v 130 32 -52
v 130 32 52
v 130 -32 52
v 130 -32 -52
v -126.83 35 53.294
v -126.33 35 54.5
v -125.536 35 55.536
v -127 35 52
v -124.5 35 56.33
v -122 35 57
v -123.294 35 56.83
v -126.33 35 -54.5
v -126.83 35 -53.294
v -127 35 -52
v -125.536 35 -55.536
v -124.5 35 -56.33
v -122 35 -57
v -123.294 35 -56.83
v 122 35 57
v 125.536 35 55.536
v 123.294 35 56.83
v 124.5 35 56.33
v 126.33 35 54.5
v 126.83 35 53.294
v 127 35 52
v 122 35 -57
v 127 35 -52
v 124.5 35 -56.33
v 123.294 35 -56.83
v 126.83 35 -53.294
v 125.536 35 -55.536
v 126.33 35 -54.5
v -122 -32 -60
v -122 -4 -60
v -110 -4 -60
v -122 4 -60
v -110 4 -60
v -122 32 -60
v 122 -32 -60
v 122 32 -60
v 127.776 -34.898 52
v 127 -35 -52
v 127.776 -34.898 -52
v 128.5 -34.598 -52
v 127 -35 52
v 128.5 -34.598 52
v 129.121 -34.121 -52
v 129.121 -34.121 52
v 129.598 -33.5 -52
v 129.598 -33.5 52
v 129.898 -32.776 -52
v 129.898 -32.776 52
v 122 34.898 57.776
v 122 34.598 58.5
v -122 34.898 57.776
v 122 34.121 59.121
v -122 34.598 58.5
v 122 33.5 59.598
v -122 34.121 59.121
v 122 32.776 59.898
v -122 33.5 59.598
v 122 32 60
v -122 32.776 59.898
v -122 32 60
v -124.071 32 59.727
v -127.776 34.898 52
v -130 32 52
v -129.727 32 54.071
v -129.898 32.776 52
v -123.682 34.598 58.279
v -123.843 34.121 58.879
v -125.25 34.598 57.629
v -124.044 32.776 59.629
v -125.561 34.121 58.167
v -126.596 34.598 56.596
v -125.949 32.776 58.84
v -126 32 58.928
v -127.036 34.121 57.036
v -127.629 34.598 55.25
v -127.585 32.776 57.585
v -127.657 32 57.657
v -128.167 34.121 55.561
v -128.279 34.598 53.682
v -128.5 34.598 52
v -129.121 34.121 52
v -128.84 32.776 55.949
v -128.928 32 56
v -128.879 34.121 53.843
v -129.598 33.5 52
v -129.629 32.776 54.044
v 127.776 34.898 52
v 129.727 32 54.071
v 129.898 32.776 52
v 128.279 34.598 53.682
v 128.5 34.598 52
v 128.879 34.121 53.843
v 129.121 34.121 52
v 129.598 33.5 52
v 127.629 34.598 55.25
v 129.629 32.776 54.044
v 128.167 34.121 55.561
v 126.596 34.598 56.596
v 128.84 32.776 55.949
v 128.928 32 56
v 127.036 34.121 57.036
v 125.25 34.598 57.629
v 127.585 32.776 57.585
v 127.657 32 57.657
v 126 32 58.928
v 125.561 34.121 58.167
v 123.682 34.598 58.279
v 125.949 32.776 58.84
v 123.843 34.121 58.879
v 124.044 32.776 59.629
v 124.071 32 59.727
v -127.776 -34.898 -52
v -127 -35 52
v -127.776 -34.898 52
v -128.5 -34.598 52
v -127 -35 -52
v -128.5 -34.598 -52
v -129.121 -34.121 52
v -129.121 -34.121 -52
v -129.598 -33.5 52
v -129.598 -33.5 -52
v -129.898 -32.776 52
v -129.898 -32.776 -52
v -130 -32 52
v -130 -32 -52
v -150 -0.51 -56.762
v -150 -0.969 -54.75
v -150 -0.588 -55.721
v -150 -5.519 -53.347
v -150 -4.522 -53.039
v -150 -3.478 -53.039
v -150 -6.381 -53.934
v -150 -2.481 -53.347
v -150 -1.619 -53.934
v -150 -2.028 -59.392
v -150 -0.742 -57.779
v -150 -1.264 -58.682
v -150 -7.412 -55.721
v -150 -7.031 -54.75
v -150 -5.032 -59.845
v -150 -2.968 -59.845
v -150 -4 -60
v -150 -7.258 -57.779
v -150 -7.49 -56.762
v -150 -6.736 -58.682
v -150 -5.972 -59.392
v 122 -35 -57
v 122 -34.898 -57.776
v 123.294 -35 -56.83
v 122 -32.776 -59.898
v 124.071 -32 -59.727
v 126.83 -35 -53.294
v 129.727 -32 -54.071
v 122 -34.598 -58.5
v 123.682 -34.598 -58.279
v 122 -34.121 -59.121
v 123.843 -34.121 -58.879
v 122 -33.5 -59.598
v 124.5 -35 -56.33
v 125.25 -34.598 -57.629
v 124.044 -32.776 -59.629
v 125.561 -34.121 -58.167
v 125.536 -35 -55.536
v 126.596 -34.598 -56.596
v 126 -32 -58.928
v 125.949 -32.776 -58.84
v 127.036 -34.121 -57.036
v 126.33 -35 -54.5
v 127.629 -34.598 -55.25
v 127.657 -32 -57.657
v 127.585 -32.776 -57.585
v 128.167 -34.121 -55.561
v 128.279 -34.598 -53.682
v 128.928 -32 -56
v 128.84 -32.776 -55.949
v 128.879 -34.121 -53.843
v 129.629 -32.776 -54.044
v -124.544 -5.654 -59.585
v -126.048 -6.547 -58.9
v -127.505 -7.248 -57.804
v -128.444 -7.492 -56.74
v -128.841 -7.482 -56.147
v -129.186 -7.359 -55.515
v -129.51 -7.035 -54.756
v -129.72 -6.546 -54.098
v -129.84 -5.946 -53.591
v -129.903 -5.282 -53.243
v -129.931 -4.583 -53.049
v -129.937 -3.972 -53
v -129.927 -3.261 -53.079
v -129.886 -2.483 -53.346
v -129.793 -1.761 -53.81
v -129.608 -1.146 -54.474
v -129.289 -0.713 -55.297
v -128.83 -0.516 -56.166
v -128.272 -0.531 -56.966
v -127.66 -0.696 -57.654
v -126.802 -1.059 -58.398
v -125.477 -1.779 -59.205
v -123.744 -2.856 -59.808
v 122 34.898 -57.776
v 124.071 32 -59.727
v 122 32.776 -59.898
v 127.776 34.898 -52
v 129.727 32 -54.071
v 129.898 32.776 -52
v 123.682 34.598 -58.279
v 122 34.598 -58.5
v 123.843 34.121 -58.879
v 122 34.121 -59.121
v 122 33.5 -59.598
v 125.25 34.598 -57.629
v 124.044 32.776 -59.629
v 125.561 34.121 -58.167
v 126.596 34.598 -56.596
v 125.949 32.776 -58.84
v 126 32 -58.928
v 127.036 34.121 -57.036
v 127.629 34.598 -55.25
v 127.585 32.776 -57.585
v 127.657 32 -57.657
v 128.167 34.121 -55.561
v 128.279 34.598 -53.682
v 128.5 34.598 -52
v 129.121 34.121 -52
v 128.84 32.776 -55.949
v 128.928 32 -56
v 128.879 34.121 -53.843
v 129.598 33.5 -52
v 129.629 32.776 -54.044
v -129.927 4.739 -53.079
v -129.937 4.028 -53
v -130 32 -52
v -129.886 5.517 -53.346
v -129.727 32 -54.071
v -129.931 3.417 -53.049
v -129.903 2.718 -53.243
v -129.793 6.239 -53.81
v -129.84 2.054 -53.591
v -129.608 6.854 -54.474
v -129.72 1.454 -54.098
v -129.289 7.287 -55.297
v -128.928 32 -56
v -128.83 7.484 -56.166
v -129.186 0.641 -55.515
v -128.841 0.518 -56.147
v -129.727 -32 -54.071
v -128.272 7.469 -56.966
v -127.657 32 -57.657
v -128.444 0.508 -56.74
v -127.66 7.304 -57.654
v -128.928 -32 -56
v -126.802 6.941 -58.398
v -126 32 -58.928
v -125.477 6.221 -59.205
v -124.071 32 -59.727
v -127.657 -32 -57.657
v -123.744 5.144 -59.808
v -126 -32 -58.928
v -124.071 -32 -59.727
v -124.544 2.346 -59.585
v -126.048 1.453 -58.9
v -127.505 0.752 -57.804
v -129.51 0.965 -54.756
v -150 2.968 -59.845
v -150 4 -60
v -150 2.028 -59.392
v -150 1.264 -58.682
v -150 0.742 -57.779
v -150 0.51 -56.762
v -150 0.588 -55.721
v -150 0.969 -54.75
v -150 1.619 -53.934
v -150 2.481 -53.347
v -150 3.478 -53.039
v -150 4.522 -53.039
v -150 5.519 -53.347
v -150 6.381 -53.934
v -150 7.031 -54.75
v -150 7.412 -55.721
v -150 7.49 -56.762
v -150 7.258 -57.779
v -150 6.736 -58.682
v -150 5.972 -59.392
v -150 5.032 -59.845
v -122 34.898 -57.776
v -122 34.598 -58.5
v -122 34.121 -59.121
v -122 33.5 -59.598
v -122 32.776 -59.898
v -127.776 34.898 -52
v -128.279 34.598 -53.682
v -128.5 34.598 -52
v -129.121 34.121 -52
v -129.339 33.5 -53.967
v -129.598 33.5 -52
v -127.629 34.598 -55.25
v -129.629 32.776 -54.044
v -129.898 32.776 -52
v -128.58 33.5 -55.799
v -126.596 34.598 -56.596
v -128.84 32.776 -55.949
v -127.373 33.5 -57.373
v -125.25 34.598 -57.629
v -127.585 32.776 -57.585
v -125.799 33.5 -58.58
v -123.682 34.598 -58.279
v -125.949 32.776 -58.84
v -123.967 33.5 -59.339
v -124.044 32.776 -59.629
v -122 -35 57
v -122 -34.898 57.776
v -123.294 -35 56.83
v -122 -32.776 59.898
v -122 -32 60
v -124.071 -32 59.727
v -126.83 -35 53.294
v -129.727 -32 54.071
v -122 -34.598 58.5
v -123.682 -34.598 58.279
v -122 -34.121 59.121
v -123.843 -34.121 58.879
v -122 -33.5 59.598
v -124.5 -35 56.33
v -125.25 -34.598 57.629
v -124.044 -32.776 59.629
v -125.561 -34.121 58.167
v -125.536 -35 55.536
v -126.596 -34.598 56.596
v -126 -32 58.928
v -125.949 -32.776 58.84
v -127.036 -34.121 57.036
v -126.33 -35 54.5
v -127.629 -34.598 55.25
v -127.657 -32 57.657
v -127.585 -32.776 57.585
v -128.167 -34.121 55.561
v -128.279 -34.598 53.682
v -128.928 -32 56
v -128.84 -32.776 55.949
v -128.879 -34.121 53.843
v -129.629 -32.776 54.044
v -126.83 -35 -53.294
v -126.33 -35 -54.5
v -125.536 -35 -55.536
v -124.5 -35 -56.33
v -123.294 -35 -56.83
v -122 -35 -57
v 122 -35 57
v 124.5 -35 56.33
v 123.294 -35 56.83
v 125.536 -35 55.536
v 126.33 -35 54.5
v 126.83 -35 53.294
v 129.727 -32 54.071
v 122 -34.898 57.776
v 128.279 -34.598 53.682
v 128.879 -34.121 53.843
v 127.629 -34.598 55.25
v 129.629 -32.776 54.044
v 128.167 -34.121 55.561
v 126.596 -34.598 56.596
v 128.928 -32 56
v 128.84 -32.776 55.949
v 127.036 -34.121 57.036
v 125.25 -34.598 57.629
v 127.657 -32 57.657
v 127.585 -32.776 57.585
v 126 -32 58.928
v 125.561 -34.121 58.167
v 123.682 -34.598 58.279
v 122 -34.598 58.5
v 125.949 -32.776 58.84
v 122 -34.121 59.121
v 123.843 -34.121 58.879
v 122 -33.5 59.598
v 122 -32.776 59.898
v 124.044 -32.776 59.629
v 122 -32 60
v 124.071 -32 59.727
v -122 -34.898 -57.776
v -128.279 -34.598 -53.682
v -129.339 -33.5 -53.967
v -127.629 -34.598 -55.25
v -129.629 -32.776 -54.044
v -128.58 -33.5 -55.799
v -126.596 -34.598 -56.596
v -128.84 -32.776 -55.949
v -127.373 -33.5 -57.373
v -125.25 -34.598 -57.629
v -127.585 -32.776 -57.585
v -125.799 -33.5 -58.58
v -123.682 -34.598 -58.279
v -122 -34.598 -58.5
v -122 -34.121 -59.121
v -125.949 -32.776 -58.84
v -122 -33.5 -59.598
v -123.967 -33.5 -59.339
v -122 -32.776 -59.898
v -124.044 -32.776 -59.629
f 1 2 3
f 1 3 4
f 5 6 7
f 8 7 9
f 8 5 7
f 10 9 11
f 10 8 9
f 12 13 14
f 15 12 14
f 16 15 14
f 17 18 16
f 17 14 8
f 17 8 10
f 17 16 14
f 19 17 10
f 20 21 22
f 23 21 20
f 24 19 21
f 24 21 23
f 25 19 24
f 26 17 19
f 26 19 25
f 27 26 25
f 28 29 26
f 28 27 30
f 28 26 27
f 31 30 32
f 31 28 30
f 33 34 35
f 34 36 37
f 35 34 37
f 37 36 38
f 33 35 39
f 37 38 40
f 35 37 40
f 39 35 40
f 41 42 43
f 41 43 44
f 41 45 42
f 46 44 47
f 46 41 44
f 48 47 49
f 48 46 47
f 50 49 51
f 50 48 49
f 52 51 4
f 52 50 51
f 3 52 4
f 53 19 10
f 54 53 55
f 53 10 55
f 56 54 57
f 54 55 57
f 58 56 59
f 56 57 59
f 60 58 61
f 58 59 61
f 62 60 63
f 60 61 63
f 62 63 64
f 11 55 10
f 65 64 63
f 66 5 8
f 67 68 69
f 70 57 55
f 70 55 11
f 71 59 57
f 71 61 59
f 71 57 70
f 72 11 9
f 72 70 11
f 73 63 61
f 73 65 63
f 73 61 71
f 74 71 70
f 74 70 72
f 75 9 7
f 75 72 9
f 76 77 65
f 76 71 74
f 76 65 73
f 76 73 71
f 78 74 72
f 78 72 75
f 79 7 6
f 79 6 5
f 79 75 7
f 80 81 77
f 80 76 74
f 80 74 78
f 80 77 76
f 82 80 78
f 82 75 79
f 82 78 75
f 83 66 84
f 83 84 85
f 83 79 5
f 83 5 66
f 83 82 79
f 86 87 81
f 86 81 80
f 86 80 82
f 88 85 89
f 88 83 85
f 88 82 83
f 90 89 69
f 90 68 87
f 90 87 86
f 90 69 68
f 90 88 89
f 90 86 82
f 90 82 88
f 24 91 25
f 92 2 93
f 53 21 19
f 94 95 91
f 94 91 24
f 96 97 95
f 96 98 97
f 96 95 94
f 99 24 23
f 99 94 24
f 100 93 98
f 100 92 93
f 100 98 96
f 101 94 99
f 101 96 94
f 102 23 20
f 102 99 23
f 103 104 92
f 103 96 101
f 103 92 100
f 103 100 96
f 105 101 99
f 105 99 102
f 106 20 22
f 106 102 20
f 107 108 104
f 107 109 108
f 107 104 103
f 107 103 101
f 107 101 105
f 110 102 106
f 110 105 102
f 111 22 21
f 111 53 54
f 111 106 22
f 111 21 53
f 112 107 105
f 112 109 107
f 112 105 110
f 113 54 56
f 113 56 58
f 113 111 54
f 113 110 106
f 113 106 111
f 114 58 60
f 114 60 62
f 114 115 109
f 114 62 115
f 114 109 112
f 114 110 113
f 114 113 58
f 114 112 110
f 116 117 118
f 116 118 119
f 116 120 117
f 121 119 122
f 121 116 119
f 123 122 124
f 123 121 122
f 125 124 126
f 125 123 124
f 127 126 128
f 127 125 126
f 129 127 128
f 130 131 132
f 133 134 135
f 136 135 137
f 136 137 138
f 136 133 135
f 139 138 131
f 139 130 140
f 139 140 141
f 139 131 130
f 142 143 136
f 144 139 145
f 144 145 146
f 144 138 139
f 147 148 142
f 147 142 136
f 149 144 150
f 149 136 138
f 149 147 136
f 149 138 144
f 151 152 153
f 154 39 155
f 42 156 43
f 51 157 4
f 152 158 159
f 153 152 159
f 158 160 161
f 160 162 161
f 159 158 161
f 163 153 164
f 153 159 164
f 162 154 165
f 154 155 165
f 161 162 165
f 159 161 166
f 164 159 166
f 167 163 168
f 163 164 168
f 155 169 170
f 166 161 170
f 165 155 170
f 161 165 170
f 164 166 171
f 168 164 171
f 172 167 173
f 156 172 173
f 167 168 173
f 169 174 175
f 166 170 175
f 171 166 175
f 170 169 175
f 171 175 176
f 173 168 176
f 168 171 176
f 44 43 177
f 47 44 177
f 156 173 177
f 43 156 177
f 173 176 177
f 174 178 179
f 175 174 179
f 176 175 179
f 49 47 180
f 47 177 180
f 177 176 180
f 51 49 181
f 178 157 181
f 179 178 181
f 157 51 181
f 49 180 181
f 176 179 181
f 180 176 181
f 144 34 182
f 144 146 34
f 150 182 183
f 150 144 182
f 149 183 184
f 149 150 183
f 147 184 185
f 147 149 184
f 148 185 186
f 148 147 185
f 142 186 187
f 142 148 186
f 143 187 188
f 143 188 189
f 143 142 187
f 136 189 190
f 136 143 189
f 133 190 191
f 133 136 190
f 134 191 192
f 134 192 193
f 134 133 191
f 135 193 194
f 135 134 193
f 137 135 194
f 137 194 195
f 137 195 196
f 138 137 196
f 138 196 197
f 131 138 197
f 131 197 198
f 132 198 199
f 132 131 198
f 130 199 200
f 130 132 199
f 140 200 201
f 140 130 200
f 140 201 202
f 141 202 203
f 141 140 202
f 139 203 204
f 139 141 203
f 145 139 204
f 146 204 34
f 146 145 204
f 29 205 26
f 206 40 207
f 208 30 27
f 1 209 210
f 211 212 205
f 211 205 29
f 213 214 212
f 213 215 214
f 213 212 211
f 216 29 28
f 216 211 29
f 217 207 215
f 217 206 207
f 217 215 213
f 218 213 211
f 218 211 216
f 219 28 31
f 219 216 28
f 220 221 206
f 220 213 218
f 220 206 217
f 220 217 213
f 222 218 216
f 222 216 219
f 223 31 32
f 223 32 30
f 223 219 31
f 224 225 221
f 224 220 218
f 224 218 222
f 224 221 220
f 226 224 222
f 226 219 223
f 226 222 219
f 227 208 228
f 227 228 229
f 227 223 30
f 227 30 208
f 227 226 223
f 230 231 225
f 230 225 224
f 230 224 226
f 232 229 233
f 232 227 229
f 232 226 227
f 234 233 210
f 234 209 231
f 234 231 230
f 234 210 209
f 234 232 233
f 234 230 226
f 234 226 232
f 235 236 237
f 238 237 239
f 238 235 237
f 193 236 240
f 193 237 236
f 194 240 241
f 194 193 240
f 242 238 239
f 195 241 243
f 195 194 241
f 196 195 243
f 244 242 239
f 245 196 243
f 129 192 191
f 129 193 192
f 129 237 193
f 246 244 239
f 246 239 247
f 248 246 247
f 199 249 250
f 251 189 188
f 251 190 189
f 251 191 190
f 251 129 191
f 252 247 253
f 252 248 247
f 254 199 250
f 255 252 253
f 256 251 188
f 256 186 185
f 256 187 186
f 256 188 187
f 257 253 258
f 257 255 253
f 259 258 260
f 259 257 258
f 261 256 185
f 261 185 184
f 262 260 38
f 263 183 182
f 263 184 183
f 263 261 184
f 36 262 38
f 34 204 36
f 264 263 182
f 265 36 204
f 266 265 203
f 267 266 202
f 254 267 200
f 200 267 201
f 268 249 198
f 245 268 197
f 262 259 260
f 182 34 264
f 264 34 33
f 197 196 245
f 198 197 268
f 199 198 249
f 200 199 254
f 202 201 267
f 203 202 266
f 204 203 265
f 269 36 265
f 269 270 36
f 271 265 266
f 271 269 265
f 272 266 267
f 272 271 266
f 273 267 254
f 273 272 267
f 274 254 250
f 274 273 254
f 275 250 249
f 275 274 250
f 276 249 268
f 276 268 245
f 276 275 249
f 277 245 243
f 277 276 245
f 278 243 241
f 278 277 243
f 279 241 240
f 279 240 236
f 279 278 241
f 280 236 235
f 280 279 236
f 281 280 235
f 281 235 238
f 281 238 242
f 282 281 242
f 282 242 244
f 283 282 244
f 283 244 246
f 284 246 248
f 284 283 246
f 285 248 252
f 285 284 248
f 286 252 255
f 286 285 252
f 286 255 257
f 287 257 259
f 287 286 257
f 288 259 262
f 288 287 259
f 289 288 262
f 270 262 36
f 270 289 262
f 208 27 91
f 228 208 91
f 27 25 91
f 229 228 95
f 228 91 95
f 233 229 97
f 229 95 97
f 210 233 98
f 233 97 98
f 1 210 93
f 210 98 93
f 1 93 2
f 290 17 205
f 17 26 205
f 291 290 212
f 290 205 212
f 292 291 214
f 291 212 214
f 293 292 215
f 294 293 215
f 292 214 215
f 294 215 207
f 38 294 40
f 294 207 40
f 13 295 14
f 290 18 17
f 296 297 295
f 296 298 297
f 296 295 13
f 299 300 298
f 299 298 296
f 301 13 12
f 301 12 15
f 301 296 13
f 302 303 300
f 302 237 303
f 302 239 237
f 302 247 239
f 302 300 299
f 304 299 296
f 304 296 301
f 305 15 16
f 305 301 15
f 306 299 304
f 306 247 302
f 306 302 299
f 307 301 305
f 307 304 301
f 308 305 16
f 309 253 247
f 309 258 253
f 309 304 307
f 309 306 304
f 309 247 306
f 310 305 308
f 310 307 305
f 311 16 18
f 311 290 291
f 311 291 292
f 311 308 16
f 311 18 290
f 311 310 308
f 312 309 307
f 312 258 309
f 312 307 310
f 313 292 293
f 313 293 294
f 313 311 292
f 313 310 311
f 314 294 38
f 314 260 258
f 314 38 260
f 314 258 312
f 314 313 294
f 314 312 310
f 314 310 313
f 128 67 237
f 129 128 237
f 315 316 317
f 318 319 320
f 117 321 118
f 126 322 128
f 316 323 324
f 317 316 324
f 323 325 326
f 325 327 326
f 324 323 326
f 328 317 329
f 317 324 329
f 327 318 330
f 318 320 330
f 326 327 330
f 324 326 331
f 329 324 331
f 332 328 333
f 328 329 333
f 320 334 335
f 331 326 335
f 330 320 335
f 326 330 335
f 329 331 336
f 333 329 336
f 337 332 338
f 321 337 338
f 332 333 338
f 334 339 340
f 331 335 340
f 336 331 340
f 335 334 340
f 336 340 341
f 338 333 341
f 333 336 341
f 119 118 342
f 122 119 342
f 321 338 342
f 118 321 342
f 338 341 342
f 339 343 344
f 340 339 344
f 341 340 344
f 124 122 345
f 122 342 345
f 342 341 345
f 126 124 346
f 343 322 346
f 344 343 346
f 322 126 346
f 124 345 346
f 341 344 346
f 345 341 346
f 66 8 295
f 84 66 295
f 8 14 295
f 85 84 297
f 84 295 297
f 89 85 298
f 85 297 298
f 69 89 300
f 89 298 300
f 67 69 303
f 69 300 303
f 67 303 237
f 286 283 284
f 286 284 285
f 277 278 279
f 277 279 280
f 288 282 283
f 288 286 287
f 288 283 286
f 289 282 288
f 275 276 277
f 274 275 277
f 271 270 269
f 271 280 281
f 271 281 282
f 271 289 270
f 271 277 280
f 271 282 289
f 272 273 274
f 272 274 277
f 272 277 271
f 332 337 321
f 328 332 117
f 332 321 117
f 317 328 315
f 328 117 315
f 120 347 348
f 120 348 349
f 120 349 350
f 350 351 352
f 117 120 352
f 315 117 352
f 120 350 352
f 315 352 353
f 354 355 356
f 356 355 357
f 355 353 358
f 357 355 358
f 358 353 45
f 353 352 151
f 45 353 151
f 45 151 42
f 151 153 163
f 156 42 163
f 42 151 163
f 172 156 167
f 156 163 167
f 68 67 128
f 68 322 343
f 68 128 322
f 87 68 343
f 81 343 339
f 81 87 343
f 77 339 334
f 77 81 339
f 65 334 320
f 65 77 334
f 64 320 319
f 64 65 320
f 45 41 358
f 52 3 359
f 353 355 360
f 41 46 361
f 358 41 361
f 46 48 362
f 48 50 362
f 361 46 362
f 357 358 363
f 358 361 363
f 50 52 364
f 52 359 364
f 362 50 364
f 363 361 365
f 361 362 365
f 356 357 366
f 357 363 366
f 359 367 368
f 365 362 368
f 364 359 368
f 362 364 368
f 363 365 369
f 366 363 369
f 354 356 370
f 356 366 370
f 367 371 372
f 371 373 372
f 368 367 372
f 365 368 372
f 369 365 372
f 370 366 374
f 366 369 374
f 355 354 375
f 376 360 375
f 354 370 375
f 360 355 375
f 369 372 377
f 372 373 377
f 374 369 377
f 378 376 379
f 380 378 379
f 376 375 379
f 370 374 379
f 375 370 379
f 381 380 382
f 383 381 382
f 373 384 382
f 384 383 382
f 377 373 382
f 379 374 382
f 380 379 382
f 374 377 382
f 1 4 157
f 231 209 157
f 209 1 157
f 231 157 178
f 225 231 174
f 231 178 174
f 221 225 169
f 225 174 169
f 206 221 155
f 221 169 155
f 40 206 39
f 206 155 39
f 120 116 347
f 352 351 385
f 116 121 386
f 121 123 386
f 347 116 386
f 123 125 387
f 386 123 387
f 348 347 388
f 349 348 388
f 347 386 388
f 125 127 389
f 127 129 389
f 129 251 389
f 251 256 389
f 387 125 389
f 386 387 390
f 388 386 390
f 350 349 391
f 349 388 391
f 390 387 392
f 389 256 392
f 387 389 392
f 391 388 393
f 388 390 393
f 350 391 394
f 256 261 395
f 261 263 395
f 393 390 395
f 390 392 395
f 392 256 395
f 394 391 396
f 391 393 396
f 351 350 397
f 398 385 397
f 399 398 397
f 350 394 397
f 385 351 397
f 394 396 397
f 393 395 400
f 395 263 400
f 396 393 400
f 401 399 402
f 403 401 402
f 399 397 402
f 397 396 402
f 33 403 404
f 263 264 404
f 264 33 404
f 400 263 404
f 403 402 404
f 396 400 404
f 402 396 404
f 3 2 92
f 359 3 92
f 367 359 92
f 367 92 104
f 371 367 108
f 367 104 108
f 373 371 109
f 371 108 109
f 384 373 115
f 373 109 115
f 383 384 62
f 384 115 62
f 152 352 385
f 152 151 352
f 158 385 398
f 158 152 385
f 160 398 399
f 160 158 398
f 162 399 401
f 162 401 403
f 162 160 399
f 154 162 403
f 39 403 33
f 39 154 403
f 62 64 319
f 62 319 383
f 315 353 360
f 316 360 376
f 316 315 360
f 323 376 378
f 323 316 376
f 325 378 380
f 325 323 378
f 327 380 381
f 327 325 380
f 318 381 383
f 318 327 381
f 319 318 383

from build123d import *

# Parameters (mm, degrees)
SKETCH_1_W      = 260
SKETCH_1_H      = 120
EXTRUDE_1_DEPTH = 35
FILLET_1_R      = 8
FILLET_2_R      = 3
SKETCH_2_R      = 3.5
EXTRUDE_2_DEPTH = 20


with BuildPart() as part:
    # 草图1 → 凸台-拉伸1 (new, symmetric)
    with BuildSketch(Plane(origin=(0, 0, 0), x_dir=(1, 0, 0), z_dir=(0, 1, 0))):
        Rectangle(SKETCH_1_W, SKETCH_1_H)
    extrude(amount=EXTRUDE_1_DEPTH, both=True)

    # 圆角1
    fillet_1_edges = [part.edges().sort_by_distance(p)[0] for p in [
        (-130, 0, -60),
        (130, 0, -60),
        (130, 0, 60),
        (-130, 0, 60),
    ]]
    fillet(fillet_1_edges, radius=FILLET_1_R)

    # 圆角2
    fillet_2_edges = [part.edges().sort_by_distance(p)[0] for p in [
        (0, -35, -60),
        (0, 35, -60),
        (-130, -35, 0),
        (130, -35, 0),
        (0, -35, 60),
        (-127.656854249, -35, -57.656854249),
        (-127.656854249, -35, 57.656854249),
        (127.656854249, -35, 57.656854249),
        (127.656854249, -35, -57.656854249),
        (130, 35, 0),
        (-130, 35, 0),
        (0, 35, 60),
        (-127.656854249, 35, -57.656854249),
        (-127.656854249, 35, 57.656854249),
        (127.656854249, 35, 57.656854249),
        (127.656854249, 35, -57.656854249),
    ]]
    fillet(fillet_2_edges, radius=FILLET_2_R)

    # 草图2 → 凸台-拉伸2 (add, symmetric)
    with BuildSketch(Plane.ZY.offset(130)):
        with Locations(Location((-56.5, 4, 0), (0, 0, 180))):
            Circle(SKETCH_2_R)
        with Locations(Location((-56.5, -4, 0), (0, 0, 180))):
            Circle(SKETCH_2_R)
    extrude(amount=EXTRUDE_2_DEPTH, both=True)


solid = part.part
